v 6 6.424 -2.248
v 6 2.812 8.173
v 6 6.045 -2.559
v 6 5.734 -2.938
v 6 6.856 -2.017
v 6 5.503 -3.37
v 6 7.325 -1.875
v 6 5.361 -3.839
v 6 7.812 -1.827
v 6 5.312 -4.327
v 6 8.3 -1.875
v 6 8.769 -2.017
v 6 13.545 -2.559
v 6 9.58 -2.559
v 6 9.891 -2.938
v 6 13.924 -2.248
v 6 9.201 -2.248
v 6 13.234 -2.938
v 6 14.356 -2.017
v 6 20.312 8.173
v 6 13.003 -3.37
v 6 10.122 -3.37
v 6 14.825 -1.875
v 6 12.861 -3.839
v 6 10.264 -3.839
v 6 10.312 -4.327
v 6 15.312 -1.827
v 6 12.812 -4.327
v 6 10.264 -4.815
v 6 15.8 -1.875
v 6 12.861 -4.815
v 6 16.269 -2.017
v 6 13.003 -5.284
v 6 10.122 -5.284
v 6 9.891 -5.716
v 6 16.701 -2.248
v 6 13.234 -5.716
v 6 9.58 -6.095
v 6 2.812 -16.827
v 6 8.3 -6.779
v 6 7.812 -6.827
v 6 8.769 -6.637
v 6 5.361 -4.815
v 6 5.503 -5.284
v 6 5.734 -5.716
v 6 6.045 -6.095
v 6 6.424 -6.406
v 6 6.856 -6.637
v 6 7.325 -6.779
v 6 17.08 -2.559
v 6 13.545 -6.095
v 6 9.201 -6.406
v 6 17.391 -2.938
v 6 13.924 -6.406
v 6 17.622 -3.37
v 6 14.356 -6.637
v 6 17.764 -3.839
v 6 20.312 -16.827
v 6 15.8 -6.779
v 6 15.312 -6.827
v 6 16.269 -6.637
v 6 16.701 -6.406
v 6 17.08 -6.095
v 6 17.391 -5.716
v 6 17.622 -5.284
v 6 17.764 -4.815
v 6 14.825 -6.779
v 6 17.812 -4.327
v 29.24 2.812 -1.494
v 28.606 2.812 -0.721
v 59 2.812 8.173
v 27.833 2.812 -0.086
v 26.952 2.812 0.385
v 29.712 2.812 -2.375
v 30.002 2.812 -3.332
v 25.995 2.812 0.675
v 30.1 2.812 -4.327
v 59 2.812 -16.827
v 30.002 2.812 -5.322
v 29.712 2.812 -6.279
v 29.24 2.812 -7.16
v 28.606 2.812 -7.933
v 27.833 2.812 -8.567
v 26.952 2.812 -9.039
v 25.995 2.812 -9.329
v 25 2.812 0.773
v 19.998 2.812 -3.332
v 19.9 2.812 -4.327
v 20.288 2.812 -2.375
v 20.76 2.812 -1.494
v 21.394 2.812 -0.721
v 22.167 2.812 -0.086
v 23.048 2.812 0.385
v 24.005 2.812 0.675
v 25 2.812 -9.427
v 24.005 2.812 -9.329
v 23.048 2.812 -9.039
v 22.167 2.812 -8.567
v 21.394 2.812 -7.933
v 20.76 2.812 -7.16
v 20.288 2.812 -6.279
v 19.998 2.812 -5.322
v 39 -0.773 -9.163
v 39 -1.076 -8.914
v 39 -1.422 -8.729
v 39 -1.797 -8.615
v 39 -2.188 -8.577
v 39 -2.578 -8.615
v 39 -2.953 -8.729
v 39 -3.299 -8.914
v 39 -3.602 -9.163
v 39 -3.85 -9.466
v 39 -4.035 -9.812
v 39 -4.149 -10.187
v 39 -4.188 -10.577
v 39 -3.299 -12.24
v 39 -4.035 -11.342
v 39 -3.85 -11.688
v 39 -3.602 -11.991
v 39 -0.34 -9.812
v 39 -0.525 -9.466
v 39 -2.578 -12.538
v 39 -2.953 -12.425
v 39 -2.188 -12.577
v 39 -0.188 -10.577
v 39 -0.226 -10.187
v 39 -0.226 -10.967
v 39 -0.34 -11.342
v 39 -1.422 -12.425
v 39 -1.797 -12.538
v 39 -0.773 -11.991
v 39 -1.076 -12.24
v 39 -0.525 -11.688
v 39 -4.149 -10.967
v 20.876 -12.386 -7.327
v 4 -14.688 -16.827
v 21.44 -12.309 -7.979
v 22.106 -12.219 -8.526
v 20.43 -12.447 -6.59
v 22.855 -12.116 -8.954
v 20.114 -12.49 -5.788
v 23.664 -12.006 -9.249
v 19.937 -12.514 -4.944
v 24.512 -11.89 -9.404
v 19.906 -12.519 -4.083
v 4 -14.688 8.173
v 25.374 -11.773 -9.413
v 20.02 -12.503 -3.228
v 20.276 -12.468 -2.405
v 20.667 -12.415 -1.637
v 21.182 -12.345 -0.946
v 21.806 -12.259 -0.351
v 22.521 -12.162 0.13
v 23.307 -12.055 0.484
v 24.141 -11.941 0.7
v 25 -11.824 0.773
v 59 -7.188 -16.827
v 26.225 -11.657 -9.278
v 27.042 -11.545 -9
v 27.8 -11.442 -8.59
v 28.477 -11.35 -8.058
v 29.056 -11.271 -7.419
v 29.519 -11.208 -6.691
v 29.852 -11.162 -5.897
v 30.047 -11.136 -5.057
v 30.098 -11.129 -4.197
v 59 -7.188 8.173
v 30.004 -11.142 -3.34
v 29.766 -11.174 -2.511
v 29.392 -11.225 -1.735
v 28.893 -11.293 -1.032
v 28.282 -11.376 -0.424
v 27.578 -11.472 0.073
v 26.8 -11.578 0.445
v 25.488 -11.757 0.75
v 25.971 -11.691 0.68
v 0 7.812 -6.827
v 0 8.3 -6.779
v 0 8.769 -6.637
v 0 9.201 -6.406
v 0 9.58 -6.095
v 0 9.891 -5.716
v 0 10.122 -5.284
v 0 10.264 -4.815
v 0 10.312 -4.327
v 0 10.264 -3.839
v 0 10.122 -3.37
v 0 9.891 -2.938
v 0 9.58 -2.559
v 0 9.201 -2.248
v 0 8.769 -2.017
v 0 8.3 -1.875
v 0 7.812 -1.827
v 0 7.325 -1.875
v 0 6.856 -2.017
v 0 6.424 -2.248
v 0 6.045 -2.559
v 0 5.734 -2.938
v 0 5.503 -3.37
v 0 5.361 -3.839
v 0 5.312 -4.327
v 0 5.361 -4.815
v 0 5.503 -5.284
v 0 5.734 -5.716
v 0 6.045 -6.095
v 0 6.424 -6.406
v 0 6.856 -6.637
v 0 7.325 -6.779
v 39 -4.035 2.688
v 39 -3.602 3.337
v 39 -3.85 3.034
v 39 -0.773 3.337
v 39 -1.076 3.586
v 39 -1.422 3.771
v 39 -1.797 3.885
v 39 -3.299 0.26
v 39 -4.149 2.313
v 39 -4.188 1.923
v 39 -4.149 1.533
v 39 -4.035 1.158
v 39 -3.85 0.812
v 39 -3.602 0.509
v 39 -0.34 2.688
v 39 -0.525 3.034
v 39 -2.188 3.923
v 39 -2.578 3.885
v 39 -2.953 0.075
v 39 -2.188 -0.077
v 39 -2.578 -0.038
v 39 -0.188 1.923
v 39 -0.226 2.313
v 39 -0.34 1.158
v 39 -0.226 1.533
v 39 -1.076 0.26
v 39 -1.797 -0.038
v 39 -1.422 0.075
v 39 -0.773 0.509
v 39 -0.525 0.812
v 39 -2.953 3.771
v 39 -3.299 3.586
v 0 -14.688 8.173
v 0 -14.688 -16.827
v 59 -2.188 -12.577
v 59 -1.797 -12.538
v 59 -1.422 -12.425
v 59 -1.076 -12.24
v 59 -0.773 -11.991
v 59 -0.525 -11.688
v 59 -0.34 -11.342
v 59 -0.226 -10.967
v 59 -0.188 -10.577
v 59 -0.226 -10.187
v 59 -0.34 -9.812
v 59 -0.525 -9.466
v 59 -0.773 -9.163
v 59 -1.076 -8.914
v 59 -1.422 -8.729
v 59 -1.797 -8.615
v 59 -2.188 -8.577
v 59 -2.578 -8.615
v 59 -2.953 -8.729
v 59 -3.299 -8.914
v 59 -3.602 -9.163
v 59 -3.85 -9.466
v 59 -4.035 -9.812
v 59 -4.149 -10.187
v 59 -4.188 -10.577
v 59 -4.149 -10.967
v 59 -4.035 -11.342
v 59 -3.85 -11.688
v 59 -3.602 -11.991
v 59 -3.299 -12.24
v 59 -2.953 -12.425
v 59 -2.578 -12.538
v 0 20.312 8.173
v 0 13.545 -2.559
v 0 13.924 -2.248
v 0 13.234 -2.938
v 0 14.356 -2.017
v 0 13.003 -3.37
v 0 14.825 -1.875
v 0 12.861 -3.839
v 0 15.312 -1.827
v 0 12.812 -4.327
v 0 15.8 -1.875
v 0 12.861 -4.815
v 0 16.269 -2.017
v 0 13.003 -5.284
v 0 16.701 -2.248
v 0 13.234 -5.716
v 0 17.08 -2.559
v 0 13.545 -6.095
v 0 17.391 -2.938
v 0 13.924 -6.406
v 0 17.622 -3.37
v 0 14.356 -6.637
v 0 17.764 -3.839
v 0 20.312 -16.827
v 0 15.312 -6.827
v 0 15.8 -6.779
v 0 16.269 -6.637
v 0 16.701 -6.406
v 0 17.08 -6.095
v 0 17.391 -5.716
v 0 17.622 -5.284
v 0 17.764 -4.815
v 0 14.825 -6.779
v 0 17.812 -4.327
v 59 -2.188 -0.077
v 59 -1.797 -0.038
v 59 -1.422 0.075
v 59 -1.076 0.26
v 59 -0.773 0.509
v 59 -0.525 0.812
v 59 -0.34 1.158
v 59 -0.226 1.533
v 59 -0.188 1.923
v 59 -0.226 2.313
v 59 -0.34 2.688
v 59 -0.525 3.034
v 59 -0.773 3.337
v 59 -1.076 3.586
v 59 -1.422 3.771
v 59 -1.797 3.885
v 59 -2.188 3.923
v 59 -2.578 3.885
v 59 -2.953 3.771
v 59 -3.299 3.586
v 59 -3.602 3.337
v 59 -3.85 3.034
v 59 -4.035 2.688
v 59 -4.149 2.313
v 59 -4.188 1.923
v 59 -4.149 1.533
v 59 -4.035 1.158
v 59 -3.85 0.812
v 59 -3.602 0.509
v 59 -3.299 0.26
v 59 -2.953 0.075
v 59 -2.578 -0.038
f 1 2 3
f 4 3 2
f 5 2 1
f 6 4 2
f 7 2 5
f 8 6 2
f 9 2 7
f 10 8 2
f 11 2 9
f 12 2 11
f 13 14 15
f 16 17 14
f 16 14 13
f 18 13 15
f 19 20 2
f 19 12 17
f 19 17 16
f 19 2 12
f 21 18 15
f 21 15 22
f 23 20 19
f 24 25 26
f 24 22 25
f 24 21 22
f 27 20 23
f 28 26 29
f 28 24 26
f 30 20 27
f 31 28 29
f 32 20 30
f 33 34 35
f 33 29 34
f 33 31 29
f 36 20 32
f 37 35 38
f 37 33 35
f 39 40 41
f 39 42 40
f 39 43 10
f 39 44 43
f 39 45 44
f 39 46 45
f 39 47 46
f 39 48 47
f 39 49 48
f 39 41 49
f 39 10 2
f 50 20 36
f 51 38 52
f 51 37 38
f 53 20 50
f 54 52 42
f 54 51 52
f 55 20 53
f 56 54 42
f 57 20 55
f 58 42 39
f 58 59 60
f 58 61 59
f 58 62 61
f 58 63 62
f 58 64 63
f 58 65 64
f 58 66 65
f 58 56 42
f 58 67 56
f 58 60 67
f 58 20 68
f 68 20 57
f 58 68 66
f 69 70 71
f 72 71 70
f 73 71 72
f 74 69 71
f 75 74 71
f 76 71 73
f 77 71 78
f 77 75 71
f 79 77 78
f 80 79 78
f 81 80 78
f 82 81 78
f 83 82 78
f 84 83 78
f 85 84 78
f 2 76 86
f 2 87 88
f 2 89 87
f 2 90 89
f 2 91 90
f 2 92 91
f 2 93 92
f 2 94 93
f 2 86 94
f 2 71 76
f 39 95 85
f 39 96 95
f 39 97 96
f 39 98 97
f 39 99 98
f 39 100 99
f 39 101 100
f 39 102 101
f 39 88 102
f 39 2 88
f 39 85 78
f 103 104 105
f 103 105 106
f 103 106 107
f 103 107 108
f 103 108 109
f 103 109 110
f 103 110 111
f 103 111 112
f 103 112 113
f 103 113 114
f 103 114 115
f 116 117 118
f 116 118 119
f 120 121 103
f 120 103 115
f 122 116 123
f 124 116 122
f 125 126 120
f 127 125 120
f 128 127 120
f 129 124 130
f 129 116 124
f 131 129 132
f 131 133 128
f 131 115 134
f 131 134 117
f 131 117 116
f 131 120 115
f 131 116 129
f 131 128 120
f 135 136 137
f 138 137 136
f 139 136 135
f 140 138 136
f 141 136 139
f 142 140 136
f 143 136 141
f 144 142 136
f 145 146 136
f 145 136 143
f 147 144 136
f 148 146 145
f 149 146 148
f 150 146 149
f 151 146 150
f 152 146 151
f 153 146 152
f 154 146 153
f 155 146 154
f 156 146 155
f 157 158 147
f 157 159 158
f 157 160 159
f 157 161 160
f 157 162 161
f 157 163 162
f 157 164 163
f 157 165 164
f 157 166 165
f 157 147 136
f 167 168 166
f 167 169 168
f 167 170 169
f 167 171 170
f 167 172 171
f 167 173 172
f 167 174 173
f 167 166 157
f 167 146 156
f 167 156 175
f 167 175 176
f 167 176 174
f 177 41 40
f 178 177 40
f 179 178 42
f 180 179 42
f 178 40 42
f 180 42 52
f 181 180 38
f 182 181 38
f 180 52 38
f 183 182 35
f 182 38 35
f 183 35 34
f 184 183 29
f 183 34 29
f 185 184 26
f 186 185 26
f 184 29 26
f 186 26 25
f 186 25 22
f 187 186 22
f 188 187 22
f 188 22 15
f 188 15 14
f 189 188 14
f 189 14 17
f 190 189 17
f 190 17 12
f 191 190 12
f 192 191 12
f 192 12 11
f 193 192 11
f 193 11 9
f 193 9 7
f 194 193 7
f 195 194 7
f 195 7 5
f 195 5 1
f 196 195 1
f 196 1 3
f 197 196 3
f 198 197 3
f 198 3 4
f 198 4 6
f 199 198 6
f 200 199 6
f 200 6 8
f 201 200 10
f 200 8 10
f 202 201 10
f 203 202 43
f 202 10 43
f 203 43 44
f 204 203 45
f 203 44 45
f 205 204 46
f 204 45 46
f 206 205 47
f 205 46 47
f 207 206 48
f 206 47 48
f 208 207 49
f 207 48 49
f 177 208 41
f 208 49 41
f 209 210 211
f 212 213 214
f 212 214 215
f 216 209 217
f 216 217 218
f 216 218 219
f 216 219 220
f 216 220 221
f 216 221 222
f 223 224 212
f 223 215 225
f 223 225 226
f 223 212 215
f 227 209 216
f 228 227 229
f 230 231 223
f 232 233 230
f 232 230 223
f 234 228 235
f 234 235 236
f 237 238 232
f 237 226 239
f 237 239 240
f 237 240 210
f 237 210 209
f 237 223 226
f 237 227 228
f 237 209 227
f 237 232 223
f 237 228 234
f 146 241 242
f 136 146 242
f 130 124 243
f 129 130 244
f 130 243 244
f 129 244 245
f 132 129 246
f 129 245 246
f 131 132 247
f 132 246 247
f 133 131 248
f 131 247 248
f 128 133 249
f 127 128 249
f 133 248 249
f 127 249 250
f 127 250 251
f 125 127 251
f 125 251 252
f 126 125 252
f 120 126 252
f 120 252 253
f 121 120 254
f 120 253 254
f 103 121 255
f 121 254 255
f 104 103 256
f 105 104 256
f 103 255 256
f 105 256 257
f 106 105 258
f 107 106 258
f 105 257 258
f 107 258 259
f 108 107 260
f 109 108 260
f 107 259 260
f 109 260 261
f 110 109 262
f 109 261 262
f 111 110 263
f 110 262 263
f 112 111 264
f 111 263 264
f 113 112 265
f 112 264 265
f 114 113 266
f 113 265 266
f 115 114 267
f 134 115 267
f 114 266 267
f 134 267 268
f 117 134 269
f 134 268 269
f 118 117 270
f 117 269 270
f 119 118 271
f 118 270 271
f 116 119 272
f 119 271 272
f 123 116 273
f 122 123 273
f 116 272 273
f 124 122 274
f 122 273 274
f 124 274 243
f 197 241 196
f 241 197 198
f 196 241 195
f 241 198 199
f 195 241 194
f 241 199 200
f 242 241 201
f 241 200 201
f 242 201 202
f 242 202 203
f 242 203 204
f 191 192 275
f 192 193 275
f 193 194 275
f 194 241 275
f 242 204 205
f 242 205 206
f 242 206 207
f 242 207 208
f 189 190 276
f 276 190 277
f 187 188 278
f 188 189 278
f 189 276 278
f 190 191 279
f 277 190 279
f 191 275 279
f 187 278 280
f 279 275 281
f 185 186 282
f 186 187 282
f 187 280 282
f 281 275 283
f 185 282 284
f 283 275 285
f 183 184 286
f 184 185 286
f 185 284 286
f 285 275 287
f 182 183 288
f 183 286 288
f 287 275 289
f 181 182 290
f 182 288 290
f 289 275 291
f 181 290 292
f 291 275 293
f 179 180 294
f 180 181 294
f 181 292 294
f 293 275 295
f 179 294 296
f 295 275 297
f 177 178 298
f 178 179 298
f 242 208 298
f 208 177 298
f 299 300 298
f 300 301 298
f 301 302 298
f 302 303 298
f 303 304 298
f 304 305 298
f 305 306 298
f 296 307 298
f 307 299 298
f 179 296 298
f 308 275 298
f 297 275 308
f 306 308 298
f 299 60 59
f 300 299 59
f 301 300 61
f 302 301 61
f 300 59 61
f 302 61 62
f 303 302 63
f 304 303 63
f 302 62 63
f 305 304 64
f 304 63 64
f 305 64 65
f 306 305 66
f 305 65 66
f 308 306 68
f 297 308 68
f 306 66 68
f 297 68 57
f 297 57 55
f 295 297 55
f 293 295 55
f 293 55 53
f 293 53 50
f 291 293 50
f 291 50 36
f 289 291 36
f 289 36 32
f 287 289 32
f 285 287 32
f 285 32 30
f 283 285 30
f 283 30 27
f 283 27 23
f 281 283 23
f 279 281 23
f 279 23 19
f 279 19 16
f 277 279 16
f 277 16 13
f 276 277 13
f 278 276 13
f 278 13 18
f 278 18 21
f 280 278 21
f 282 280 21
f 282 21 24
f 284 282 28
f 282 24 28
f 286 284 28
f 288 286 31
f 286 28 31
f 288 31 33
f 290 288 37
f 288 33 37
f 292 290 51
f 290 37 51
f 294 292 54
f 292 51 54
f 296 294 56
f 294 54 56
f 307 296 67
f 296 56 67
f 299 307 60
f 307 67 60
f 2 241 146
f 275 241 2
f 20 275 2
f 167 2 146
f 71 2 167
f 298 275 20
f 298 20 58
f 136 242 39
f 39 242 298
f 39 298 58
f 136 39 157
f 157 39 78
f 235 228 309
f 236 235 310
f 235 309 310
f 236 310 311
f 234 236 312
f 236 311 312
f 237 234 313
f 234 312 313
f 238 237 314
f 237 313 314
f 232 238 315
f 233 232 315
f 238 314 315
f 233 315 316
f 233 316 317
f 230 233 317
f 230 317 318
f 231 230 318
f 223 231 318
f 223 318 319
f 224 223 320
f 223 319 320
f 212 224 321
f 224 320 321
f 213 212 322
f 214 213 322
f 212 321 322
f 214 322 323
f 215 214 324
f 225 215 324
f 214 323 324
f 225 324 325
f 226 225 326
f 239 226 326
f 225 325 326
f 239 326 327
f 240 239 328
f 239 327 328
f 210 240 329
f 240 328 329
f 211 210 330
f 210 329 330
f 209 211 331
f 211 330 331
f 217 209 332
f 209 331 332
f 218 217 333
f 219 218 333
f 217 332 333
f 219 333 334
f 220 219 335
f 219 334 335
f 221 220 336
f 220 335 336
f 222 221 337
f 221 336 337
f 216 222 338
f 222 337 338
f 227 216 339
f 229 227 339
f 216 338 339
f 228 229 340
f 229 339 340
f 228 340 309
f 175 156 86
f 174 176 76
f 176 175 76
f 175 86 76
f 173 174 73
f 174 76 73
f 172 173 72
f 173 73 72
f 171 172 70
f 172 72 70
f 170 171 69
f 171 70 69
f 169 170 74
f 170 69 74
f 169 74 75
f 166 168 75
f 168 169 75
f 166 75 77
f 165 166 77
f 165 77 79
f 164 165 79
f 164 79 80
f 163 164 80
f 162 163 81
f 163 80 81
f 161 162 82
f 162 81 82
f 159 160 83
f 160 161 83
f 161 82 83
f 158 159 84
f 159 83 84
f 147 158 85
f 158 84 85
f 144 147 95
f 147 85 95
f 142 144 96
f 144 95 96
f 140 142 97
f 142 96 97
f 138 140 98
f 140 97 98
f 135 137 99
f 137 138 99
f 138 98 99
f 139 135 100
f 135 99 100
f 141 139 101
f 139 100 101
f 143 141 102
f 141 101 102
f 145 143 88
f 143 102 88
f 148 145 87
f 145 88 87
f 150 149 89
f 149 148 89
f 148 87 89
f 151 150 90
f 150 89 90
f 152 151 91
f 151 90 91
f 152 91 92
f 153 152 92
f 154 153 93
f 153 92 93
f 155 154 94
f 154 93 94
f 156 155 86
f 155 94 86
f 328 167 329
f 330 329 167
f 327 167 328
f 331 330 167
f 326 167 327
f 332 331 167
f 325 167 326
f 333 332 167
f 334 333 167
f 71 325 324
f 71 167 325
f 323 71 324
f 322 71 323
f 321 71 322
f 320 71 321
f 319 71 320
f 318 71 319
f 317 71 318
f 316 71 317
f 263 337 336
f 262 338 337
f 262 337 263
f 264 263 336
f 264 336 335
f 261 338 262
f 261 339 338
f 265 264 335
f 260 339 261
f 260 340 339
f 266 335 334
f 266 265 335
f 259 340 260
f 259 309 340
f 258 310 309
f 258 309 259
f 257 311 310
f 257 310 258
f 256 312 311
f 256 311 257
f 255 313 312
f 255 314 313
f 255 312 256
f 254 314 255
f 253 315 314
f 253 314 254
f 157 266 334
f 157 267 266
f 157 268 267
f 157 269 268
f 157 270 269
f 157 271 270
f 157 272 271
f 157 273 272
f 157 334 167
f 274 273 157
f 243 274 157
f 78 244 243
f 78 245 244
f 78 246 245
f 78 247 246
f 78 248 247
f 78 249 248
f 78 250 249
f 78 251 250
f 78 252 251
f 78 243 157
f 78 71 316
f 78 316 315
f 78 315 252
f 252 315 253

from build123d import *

# Parameters (mm, degrees)
CROQUIS3_W              = 25
CROQUIS3_H              = 35
SALIENTE_EXTRUIR2_DEPTH = 4
CROQUIS5_W              = 25
CROQUIS5_H              = 17.5
SALIENTE_EXTRUIR3_DEPTH = 2
CROQUIS7_W              = 25
CROQUIS7_H              = 10
SALIENTE_EXTRUIR5_DEPTH = 55
CROQUIS8_R              = 2.5
CORTAR_EXTRUIR1_DEPTH   = 55
SALIENTE_EXTRUIR6_DEPTH = 25
CROQUIS9_R              = 5.1
CORTAR_EXTRUIR3_DEPTH   = 4
CROQUIS11_R             = 2
CORTAR_EXTRUIR4_DEPTH   = 20
CROQUIS12_R             = 5.1
CORTAR_EXTRUIR5_DEPTH   = 45


with BuildPart() as part:
    # Croquis3 → Saliente-Extruir2 (new body)
    with BuildSketch(Plane(origin=(0, 0, 0), x_dir=(0, 0, -1), z_dir=(1, 0, 0))):
        with Locations((4.326923077, 2.8125)):
            Rectangle(CROQUIS3_W, CROQUIS3_H)
    extrude(amount=SALIENTE_EXTRUIR2_DEPTH)

    # Croquis5 → Saliente-Extruir3 (add)
    with BuildSketch(Plane(origin=(4, 0, 0), x_dir=(0, 0, -1), z_dir=(1, 0, 0))):
        with Locations((4.326923077, 11.5625)):
            Rectangle(CROQUIS5_W, CROQUIS5_H)
    extrude(amount=SALIENTE_EXTRUIR3_DEPTH)

    # Croquis7 → Saliente-Extruir5 (add)
    with BuildSketch(Plane(origin=(4, 0, 0), x_dir=(0, 0, -1), z_dir=(1, 0, 0))):
        with Locations((4.326923077, -2.1875)):
            Rectangle(CROQUIS7_W, CROQUIS7_H)
    extrude(amount=SALIENTE_EXTRUIR5_DEPTH)

    # Croquis8 → Cortar-Extruir1 (cut)
    with BuildSketch(Plane(origin=(6, 0, 0), x_dir=(0, 0, -1), z_dir=(1, 0, 0))):
        with Locations((4.326923077, 15.3125)):
            Circle(CROQUIS8_R)
        with Locations((4.326923077, 7.8125)):
            Circle(CROQUIS8_R)
    extrude(amount=-CORTAR_EXTRUIR1_DEPTH, mode=Mode.SUBTRACT)

    # Croquis10 → Saliente-Extruir6 (add, through all)
    with BuildSketch(Plane.XY.offset(8.173076923)):
        Polygon((4, -14.6875), (59, -7.1875), (4, -7.1875), align=None)
    extrude(amount=-SALIENTE_EXTRUIR6_DEPTH)

    # Croquis9 → Cortar-Extruir3 (cut)
    with BuildSketch(Plane(origin=(0, 2.8125, 0), x_dir=(1, 0, 0), z_dir=(0, 1, 0))):
        with Locations(Location((25, 4.326923077, 0), (0, 0, 270))):
            Circle(CROQUIS9_R)
    extrude(amount=-CORTAR_EXTRUIR3_DEPTH, mode=Mode.SUBTRACT)

    # Croquis11 → Cortar-Extruir4 (cut)
    with BuildSketch(Plane(origin=(59, 0, 0), x_dir=(0, 0, -1), z_dir=(1, 0, 0))):
        with Locations((-1.923076923, -2.1875)):
            Circle(CROQUIS11_R)
        with Locations((10.576923077, -2.1875)):
            Circle(CROQUIS11_R)
    extrude(amount=-CORTAR_EXTRUIR4_DEPTH, mode=Mode.SUBTRACT)

    # Croquis12 → Cortar-Extruir5 (cut)
    with BuildSketch(Plane(origin=(0, -1.1875, 0), x_dir=(1, 0, 0), z_dir=(0, 1, 0))):
        with Locations(Location((25, 4.326923077, 0), (0, 0, 270))):
            Circle(CROQUIS12_R)
    extrude(amount=-CORTAR_EXTRUIR5_DEPTH, mode=Mode.SUBTRACT)


solid = part.part
